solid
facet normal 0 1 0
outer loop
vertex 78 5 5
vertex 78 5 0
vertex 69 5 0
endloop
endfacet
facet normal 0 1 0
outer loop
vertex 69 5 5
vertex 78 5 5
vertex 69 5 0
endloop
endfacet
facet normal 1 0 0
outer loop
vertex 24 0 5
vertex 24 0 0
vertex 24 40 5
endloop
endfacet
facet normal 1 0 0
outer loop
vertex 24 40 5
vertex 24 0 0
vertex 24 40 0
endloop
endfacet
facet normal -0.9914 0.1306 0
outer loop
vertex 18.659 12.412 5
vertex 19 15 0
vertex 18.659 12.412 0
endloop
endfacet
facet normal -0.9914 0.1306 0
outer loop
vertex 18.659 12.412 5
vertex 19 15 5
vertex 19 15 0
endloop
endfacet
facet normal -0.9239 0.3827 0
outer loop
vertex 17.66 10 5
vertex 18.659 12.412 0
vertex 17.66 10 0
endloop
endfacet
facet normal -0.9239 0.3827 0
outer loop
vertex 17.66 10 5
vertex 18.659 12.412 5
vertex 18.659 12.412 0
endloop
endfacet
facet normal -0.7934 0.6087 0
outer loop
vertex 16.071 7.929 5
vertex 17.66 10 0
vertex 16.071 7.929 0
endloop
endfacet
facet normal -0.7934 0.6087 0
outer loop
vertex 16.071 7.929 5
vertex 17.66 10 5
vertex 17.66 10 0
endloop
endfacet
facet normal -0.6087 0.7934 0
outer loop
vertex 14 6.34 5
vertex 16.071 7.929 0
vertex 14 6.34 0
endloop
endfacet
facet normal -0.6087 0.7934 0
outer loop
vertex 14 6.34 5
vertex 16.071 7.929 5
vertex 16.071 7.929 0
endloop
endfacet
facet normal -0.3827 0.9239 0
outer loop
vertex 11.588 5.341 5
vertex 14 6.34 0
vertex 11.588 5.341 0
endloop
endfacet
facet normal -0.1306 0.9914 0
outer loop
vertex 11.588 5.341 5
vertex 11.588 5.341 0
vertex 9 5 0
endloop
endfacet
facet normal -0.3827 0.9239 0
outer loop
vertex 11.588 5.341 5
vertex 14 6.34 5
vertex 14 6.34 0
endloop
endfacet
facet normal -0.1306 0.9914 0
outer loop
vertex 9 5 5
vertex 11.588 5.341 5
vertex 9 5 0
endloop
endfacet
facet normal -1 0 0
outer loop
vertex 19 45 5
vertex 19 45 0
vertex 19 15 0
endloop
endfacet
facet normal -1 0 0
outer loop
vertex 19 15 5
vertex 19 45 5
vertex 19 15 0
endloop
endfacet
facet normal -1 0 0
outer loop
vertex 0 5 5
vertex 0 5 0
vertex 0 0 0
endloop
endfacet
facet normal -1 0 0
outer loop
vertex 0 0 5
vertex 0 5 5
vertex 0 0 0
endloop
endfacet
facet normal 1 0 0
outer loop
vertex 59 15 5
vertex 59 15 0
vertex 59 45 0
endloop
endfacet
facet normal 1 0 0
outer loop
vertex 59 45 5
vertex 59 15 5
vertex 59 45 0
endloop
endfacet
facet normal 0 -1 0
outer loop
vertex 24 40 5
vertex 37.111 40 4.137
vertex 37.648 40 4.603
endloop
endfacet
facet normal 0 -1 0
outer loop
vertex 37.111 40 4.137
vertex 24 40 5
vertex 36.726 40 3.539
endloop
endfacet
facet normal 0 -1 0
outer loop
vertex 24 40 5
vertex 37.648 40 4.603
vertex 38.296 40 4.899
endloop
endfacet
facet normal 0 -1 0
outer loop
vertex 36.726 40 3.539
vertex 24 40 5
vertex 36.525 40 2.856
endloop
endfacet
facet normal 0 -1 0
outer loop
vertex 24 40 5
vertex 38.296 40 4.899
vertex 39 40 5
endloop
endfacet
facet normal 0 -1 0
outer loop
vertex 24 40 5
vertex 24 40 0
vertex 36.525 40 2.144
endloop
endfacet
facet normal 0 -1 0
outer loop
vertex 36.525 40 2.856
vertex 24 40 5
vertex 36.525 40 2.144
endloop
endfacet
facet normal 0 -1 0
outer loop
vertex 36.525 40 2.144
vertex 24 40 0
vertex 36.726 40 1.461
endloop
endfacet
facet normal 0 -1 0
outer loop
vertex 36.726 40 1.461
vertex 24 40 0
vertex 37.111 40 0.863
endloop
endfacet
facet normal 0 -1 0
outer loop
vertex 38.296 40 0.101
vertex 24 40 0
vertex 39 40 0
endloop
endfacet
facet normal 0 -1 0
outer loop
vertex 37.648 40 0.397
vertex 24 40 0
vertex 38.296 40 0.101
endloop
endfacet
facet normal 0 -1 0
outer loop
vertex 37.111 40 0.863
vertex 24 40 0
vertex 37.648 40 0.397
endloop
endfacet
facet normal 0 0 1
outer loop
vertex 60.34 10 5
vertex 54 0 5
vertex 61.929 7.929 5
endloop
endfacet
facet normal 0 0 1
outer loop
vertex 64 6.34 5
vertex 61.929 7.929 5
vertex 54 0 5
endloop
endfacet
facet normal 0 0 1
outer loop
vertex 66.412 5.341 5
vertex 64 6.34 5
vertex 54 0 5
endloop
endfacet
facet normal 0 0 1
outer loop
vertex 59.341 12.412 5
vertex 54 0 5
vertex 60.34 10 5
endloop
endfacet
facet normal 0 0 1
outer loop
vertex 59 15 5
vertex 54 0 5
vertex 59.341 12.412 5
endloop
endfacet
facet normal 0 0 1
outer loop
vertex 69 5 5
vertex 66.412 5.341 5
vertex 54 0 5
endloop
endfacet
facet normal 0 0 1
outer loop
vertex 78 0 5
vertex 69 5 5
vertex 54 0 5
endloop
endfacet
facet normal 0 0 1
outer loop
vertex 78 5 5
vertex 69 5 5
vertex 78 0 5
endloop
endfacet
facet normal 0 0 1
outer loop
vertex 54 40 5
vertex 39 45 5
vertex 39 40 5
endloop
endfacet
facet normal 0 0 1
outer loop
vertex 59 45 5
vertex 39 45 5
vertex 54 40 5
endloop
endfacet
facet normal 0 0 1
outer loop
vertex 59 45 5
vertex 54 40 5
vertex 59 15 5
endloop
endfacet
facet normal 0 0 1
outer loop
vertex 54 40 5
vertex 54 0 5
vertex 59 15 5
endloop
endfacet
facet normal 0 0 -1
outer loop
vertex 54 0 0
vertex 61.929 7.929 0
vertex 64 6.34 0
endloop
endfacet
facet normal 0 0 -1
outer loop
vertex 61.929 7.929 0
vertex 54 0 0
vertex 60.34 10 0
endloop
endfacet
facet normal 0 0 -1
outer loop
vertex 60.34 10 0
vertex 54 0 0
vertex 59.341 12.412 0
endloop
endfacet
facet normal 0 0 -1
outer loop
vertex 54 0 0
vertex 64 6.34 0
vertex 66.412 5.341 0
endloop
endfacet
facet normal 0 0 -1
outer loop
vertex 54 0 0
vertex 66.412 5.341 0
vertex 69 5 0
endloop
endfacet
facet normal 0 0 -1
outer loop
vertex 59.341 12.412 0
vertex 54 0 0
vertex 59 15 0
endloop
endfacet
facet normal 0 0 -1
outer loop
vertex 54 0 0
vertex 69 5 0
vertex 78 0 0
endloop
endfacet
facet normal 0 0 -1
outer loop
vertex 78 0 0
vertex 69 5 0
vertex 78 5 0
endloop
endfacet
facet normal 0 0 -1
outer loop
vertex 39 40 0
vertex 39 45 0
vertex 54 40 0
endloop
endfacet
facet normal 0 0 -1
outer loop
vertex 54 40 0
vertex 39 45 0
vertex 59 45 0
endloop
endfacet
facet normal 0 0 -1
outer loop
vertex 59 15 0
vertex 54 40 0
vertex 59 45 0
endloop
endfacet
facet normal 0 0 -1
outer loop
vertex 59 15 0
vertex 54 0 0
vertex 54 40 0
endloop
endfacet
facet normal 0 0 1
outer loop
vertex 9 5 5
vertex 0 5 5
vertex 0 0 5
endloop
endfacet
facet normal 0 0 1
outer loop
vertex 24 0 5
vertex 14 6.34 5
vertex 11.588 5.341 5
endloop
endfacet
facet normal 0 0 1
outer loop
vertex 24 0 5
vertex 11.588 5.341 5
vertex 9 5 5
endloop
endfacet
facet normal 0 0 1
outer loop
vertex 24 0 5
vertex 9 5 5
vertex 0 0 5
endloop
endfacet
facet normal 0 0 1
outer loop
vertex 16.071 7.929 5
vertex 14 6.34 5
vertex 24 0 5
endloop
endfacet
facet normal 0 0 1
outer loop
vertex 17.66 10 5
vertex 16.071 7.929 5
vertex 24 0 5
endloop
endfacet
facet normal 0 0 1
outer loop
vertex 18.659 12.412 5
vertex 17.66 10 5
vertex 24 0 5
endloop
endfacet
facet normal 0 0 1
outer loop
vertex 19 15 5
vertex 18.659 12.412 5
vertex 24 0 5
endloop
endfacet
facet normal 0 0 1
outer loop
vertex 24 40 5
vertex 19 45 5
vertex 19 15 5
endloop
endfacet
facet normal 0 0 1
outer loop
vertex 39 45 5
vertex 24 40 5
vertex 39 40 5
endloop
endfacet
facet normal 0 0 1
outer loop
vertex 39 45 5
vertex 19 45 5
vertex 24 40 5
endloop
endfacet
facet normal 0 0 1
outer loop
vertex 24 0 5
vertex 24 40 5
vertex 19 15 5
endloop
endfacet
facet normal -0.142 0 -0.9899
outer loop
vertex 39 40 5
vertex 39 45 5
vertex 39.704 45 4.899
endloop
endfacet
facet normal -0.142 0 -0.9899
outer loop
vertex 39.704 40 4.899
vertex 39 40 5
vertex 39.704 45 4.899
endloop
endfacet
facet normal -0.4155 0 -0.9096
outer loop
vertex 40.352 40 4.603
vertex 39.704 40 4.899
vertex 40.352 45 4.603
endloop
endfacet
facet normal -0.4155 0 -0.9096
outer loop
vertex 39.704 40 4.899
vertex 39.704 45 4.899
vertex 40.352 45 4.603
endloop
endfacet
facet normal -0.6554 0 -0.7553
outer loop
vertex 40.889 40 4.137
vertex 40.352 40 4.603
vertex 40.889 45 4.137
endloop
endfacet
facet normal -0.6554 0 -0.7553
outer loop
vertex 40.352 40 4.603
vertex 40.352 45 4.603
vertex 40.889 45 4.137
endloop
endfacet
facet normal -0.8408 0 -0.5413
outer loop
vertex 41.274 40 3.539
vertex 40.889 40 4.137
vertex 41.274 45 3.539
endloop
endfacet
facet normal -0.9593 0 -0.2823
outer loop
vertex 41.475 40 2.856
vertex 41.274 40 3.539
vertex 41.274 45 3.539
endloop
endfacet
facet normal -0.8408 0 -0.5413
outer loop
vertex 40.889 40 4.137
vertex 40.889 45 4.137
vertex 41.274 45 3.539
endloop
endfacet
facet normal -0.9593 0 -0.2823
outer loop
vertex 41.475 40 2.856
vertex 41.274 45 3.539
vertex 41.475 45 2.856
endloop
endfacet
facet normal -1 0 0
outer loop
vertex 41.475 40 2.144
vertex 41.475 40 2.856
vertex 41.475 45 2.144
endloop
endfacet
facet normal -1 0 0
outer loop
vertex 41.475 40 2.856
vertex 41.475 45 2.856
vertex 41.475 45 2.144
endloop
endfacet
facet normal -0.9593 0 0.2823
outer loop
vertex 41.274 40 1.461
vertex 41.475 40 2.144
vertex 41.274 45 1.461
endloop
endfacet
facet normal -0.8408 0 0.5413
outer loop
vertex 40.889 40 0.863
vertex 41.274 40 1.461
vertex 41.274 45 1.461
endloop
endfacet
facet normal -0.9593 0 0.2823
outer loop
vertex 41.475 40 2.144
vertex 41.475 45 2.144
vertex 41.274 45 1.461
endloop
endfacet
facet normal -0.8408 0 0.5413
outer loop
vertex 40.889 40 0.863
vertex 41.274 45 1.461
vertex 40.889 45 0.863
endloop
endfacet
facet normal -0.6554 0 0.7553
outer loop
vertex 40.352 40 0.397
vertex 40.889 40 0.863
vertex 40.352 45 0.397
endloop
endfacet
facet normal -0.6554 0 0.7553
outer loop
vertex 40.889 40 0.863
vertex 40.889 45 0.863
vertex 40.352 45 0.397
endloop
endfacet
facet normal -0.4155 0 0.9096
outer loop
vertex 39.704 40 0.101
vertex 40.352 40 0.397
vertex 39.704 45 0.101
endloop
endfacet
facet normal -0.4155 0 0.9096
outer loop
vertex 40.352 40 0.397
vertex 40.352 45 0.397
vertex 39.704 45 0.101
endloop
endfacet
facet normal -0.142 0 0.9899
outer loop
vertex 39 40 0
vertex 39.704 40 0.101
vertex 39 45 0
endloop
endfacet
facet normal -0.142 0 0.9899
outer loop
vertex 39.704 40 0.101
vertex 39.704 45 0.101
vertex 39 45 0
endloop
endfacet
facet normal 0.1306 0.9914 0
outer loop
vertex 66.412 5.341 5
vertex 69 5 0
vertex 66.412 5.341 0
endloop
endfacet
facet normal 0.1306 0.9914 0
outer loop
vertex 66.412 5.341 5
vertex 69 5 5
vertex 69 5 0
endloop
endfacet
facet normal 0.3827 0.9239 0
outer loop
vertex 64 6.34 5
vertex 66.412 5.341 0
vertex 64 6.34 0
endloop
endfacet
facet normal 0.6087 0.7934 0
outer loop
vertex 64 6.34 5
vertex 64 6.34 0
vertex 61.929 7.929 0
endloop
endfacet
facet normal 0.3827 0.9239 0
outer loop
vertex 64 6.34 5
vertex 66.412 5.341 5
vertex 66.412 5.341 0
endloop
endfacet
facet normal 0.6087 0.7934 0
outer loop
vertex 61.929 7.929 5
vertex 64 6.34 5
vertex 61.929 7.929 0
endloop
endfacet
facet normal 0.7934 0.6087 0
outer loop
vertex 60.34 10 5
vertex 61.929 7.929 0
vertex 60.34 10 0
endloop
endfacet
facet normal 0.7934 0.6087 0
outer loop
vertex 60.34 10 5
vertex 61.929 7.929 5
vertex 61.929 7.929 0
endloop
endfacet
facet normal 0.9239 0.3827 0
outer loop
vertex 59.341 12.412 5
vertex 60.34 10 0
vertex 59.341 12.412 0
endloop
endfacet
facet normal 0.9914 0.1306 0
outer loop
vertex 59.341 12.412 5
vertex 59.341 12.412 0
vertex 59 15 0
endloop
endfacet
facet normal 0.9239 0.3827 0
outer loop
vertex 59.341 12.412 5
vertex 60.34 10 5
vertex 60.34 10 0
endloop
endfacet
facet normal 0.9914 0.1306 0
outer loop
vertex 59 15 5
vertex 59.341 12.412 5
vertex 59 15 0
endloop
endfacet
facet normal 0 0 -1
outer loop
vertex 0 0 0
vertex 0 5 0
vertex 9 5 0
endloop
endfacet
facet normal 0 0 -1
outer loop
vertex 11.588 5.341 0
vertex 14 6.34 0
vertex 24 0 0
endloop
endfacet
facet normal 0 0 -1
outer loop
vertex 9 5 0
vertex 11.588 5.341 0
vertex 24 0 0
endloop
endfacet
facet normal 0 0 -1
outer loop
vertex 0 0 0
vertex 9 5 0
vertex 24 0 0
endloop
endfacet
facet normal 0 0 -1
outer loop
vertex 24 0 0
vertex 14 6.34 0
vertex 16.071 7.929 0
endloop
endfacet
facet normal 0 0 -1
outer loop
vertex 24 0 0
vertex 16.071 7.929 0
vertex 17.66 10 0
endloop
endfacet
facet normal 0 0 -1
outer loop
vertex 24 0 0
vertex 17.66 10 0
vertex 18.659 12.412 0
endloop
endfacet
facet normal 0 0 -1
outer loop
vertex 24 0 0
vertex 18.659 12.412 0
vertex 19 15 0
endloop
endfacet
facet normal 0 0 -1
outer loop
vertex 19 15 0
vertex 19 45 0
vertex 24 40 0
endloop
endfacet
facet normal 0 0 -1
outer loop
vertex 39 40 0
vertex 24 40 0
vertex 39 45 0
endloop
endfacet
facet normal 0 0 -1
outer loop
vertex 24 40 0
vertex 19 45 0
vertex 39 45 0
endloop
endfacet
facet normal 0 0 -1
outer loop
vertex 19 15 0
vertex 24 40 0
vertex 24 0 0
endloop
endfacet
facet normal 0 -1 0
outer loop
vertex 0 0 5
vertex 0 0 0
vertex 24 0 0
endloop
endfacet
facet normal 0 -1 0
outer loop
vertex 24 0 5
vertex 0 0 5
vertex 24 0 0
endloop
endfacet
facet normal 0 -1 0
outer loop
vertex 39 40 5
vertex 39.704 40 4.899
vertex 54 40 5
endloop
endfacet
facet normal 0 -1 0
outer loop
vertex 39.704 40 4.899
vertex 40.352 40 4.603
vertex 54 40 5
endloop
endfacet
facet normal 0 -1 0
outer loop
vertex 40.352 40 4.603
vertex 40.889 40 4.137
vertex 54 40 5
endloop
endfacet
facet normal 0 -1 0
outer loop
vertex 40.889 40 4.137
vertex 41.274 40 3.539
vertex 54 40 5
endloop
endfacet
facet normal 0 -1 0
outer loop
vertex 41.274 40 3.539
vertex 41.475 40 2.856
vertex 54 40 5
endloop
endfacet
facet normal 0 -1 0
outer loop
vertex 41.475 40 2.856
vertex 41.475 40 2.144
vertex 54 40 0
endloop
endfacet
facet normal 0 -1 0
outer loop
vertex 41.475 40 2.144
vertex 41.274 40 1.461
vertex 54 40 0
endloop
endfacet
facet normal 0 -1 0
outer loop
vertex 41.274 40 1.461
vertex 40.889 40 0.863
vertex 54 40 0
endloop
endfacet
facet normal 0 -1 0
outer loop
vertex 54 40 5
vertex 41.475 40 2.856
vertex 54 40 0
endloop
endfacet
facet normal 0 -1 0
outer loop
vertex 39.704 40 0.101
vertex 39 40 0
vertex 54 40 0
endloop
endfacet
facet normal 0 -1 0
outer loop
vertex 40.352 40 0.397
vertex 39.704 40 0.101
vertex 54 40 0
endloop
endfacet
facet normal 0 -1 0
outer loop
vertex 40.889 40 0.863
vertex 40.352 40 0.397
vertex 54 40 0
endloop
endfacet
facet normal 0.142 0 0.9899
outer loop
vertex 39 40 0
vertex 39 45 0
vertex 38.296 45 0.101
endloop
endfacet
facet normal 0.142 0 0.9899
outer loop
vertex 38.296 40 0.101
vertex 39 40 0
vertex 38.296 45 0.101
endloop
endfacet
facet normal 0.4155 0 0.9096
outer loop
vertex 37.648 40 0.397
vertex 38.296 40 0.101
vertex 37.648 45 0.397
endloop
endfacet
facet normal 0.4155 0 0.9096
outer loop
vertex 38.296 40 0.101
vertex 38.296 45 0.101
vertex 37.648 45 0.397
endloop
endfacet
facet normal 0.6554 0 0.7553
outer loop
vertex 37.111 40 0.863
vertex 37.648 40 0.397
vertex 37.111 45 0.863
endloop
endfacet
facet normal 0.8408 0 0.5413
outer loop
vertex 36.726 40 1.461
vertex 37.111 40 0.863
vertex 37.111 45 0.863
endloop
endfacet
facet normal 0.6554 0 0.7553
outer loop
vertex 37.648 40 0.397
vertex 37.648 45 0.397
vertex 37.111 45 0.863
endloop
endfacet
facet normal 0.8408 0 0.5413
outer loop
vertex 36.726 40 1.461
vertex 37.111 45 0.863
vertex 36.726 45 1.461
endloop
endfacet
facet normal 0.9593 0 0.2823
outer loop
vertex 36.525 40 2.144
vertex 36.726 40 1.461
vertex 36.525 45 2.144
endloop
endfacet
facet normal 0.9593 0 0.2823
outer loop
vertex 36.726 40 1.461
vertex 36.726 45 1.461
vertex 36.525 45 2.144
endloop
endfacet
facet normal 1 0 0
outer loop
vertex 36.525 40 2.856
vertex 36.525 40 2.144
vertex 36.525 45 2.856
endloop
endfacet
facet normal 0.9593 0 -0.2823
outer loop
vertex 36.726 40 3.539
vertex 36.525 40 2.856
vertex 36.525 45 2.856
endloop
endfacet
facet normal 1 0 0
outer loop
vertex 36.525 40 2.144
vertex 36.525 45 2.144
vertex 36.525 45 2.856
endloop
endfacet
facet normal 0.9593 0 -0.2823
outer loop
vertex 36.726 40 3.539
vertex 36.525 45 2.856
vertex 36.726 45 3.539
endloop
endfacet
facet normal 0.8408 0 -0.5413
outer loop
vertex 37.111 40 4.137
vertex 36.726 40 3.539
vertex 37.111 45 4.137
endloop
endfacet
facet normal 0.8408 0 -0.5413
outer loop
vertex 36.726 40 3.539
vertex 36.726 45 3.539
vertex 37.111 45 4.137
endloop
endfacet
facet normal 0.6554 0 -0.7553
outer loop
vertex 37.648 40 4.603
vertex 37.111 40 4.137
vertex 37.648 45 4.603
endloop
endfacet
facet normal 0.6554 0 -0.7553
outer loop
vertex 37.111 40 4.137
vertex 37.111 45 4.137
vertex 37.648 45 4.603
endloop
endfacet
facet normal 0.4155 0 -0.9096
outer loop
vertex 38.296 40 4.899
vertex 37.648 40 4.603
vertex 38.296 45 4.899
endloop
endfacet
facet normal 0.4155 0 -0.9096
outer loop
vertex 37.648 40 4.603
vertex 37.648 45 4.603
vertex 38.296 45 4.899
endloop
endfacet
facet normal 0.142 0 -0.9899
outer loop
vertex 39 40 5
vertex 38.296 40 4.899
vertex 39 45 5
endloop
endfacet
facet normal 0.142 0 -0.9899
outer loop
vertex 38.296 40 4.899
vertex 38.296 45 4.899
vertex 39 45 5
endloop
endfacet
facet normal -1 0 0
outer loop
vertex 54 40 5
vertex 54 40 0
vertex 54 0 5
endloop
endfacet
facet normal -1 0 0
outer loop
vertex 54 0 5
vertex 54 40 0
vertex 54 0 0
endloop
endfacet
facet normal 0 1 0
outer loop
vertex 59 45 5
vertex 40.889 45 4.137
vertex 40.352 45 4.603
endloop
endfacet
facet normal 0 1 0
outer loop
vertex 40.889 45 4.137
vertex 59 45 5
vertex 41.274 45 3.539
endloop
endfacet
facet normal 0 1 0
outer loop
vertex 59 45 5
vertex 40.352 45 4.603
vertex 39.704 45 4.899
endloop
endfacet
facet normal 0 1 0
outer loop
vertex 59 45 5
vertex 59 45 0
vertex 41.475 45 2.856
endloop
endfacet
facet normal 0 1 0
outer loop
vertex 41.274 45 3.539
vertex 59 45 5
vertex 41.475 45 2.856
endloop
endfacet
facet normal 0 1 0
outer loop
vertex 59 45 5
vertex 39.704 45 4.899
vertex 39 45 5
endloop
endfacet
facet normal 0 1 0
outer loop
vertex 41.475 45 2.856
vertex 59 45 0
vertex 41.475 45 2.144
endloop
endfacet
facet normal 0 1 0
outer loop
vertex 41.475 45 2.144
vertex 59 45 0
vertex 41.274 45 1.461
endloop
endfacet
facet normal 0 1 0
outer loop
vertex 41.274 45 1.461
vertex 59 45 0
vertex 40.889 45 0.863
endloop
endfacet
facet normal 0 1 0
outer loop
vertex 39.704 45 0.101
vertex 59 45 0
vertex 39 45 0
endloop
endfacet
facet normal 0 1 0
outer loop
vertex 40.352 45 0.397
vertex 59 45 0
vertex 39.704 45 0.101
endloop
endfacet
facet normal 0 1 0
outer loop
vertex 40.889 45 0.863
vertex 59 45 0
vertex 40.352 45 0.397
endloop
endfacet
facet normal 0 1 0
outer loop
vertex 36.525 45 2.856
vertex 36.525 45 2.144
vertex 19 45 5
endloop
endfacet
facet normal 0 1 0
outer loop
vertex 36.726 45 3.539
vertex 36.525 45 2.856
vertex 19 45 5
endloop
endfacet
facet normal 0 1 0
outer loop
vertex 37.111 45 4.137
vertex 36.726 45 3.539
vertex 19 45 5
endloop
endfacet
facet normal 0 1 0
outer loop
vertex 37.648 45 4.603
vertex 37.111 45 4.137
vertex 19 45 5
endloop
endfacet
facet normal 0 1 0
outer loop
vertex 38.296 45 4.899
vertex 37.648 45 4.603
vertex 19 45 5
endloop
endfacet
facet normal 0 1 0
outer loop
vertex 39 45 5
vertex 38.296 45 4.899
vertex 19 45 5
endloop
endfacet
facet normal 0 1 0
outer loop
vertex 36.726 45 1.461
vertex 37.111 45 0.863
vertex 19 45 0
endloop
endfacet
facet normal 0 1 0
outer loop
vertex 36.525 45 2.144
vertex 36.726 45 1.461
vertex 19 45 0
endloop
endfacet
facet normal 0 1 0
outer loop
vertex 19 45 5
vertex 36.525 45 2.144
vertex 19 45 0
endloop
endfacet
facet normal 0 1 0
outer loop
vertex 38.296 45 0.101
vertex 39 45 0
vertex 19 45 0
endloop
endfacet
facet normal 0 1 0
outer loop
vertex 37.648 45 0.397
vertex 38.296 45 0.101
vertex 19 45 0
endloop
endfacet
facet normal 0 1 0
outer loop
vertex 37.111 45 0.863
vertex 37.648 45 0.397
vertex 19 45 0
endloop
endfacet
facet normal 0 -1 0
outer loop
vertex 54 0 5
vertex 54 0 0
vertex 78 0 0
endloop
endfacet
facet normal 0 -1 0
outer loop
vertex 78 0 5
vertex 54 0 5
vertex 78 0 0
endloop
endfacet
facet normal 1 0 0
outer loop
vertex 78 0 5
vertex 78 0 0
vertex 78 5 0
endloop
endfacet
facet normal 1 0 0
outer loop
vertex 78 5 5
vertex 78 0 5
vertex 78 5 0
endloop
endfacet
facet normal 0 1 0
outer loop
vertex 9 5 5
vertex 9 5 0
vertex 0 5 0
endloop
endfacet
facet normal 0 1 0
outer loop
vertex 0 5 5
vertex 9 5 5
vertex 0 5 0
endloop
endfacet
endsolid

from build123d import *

# Parameters (mm, degrees)
BOSS_EXTRUDE1_DEPTH = 5
FILLET1_R           = 10
SKETCH2_R           = 2.5
CUT_EXTRUDE1_DEPTH  = 5


with BuildPart() as part:
    # Sketch1 → Boss-Extrude1 (new body)
    with BuildSketch(Plane.XY):
        Polygon((0, 0), (24, 0), (24, 40), (39, 40), (54, 40), (54, 0), (78, 0), (78, 5), (59, 5), (59, 45), (39, 45), (19, 45), (19, 5), (0, 5), align=None)
    extrude(amount=BOSS_EXTRUDE1_DEPTH)

    # Fillet1
    fillet1_edges = [part.edges().sort_by_distance(p)[0] for p in [
        (19, 5, 2.5),
        (59, 5, 2.5),
    ]]
    fillet(fillet1_edges, radius=FILLET1_R)

    # Sketch2 → Cut-Extrude1 (cut)
    with BuildSketch(Plane(origin=(0, 45, 0), x_dir=(1, 0, 0), z_dir=(0, 1, 0))):
        with Locations((39, -2.5)):
            Circle(SKETCH2_R)
    extrude(amount=-CUT_EXTRUDE1_DEPTH, mode=Mode.SUBTRACT)


with BuildPart() as cut_extrude1_piece_1:
    # of the separate pieces the step leaves, piece 1, a body of its own (cut_extrude1_pieces)
    add(part.part.solids().sort_by_distance((69, 5, 5))[0])


with BuildPart() as cut_extrude1_piece_2:
    # of the separate pieces the step leaves, piece 2, a body of its own (cut_extrude1_pieces)
    add(part.part.solids().sort_by_distance((24, 40, 5))[0])


solid = Compound([cut_extrude1_piece_1.part, cut_extrude1_piece_2.part])
